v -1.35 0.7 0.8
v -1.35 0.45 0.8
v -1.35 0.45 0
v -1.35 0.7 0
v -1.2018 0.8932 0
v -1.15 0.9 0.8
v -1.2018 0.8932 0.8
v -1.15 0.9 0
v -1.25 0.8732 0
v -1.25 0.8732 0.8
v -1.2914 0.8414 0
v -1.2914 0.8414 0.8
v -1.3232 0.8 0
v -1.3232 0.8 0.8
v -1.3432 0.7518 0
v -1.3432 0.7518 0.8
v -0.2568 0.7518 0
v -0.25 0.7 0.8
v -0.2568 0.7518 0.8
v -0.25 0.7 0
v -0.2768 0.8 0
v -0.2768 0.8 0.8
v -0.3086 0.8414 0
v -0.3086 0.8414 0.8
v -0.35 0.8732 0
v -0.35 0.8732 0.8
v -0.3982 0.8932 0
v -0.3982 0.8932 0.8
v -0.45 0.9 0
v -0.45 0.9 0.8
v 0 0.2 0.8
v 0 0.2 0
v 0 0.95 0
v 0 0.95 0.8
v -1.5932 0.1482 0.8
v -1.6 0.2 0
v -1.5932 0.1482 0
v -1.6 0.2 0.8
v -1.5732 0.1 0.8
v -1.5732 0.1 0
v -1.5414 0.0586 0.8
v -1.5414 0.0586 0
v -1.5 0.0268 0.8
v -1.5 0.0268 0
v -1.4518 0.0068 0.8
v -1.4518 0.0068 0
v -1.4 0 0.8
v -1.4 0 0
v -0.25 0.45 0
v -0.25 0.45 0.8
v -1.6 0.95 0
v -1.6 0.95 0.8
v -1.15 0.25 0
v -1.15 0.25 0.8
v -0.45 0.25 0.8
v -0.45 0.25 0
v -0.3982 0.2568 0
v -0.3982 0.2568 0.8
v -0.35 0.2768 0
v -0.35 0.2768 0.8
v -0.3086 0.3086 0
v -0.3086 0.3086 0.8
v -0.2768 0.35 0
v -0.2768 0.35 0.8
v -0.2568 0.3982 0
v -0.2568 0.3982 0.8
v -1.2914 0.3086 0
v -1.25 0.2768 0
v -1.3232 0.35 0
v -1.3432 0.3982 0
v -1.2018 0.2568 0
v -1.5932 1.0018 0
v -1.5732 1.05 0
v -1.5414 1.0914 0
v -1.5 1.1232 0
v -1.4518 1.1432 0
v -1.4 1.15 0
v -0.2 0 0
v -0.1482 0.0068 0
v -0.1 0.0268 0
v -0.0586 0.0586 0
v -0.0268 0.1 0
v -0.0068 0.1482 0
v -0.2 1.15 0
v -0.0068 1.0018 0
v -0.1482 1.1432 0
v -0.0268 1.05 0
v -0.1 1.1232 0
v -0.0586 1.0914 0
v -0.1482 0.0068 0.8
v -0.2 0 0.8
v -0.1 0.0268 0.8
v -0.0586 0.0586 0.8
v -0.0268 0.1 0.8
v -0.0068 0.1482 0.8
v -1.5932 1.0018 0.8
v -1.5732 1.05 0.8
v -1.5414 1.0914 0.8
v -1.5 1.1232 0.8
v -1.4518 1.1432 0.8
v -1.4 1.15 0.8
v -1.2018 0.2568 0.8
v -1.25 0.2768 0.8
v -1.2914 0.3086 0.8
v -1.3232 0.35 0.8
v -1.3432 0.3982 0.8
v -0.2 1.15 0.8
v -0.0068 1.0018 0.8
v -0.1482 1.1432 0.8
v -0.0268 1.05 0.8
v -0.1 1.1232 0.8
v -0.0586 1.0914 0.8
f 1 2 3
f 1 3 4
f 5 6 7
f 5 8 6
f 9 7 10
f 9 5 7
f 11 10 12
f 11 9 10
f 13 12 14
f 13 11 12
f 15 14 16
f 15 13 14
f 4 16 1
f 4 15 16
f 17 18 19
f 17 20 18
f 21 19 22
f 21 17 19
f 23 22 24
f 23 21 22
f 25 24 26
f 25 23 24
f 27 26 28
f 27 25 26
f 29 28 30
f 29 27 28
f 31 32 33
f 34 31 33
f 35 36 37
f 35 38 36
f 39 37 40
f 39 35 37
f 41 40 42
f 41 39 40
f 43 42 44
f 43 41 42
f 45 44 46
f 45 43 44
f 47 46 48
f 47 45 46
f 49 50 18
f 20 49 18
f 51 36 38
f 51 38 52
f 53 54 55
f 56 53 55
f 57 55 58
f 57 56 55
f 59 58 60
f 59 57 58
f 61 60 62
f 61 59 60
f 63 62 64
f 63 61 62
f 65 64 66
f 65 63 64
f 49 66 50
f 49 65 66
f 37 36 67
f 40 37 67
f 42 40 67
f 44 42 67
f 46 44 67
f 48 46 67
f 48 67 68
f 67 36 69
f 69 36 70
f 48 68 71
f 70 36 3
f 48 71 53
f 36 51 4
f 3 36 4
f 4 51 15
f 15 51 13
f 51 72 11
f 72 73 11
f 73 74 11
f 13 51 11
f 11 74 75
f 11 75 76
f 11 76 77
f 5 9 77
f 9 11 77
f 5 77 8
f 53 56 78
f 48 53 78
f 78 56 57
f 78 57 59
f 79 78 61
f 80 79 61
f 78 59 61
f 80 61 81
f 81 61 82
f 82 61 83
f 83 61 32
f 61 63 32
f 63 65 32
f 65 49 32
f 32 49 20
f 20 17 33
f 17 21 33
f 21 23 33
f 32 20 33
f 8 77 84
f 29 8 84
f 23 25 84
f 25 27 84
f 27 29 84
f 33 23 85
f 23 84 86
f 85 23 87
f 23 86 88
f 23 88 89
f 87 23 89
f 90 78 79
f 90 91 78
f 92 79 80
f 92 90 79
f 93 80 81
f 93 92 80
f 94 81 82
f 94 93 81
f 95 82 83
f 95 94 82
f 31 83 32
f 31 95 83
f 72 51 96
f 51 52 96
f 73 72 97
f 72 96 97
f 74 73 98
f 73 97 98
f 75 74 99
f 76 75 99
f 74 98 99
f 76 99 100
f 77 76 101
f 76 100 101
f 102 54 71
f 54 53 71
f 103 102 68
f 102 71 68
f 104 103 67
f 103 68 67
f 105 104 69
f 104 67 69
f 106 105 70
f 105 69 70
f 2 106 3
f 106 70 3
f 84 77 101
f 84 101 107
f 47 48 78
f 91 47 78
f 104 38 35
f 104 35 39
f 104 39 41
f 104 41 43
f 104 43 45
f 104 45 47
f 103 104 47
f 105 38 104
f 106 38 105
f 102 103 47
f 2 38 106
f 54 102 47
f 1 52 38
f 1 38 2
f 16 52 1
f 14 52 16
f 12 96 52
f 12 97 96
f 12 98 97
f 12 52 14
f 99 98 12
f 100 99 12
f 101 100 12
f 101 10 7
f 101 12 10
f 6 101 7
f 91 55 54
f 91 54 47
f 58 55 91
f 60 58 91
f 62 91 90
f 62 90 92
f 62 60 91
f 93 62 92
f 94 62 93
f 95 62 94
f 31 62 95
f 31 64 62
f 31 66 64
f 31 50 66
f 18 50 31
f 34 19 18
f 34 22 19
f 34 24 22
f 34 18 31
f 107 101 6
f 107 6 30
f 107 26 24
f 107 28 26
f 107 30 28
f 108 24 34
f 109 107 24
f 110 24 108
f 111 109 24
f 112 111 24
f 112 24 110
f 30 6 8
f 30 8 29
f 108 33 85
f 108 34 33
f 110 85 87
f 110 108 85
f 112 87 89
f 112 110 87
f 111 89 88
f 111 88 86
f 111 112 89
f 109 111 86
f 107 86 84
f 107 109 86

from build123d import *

# Parameters (mm, degrees)
SKETCH1_W           = 1.6
SKETCH1_H           = 1.15
BOSS_EXTRUDE1_DEPTH = 0.8
FILLET1_R           = 0.2
SKETCH2_W           = 1.1
SKETCH2_H           = 0.65
CUT_EXTRUDE1_DEPTH  = 0.8
FILLET2_R           = 0.2


with BuildPart() as part:
    # Sketch1 → Boss-Extrude1 (new body)
    with BuildSketch(Plane.XY):
        with Locations((-0.8, 0.575)):
            Rectangle(SKETCH1_W, SKETCH1_H)
    extrude(amount=BOSS_EXTRUDE1_DEPTH)

    # Fillet1
    fillet1_edges = [part.edges().sort_by_distance(p)[0] for p in [
        (0, 0, 0.4),
        (-1.6, 0, 0.4),
        (-1.6, 1.15, 0.4),
        (0, 1.15, 0.4),
    ]]
    fillet(fillet1_edges, radius=FILLET1_R)

    # Sketch2 → Cut-Extrude1 (cut)
    with BuildSketch(Plane.XY.offset(0.8)):
        with Locations((-0.8, 0.575)):
            Rectangle(SKETCH2_W, SKETCH2_H)
    extrude(amount=-CUT_EXTRUDE1_DEPTH, mode=Mode.SUBTRACT)

    # Fillet2
    fillet2_edges = [part.edges().sort_by_distance(p)[0] for p in [
        (-1.35, 0.25, 0.4),
        (-1.35, 0.9, 0.4),
        (-0.25, 0.9, 0.4),
        (-0.25, 0.25, 0.4),
    ]]
    fillet(fillet2_edges, radius=FILLET2_R)


solid = part.part
